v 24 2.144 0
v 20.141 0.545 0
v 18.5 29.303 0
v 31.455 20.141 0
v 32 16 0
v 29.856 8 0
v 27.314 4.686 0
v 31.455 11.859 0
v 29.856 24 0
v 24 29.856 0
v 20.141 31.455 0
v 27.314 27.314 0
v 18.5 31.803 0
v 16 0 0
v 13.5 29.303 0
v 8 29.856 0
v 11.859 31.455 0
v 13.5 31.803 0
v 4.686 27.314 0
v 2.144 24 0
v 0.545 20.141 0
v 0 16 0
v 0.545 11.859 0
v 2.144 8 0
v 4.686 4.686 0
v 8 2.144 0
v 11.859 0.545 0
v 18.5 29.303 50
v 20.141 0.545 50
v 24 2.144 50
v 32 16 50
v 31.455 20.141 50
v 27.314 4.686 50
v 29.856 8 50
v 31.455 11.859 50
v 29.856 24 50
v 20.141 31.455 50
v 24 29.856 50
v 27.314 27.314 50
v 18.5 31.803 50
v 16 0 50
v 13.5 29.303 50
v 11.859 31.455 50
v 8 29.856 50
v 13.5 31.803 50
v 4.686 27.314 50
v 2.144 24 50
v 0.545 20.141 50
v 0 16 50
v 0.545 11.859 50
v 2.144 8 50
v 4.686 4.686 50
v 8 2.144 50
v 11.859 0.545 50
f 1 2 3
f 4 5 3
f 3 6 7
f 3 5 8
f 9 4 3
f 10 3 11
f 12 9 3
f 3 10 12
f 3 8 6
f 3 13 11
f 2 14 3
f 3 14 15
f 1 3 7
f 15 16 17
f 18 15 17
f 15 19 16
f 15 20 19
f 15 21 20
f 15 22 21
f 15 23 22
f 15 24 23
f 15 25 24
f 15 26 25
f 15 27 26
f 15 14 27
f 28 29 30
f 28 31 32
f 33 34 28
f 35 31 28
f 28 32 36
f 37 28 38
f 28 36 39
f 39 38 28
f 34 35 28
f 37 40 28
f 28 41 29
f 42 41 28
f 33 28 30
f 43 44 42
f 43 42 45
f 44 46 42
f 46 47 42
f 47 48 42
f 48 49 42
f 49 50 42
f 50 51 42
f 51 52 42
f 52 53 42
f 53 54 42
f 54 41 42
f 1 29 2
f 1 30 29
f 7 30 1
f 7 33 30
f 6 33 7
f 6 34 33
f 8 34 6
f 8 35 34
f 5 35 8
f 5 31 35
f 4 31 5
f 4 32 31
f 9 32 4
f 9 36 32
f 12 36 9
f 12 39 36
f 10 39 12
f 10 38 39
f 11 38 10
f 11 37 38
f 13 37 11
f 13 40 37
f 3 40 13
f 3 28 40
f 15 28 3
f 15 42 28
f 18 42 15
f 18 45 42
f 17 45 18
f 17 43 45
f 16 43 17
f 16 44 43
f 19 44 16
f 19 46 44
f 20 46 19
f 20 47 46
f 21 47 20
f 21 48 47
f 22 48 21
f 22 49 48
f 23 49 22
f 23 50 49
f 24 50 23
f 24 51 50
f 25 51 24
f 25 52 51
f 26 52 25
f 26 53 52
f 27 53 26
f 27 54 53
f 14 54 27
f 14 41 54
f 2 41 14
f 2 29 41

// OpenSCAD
$fn = 32;

// ----------------------------------------------------------------------
// Keyway shaft: d32 shaft, key 5 x 2.5 mm
// ----------------------------------------------------------------------

// --- parameters (mm) ---
shaft_r = 16;             // shaft radius
key_w = 5;                // keyway width
key_d = 2.5;              // keyway depth below the surface line
plate_t = 50;             // shaft length, Z (extrusion height)
fit_tol = 0.05;           // declared fit tolerance (prompt contract)
free_tol = 0.3;           // declared free tolerance (prompt contract)

shaft_d = 2 * shaft_r;  // shaft diameter
circle_step = 15;  // polygon sampling step, degrees

profile = [[11.859, 31.455], [8, 29.856], [4.686, 27.314], [2.144, 24], [0.545, 20.141], [0, 16], [0.545, 11.859], [2.144, 8], [4.686, 4.686], [8, 2.144], [11.859, 0.545], [16, 0], [20.141, 0.545], [24, 2.144], [27.314, 4.686], [29.856, 8], [31.455, 11.859], [32, 16], [31.455, 20.141], [29.856, 24], [27.314, 27.314], [24, 29.856], [20.141, 31.455], [18.5, 31.803], [18.5, 29.303], [13.5, 29.303], [13.5, 31.803]];  // primary outline, 27 points, counter clockwise

// --- the one profile operation ---
linear_extrude(height = plate_t) polygon(points = profile);
